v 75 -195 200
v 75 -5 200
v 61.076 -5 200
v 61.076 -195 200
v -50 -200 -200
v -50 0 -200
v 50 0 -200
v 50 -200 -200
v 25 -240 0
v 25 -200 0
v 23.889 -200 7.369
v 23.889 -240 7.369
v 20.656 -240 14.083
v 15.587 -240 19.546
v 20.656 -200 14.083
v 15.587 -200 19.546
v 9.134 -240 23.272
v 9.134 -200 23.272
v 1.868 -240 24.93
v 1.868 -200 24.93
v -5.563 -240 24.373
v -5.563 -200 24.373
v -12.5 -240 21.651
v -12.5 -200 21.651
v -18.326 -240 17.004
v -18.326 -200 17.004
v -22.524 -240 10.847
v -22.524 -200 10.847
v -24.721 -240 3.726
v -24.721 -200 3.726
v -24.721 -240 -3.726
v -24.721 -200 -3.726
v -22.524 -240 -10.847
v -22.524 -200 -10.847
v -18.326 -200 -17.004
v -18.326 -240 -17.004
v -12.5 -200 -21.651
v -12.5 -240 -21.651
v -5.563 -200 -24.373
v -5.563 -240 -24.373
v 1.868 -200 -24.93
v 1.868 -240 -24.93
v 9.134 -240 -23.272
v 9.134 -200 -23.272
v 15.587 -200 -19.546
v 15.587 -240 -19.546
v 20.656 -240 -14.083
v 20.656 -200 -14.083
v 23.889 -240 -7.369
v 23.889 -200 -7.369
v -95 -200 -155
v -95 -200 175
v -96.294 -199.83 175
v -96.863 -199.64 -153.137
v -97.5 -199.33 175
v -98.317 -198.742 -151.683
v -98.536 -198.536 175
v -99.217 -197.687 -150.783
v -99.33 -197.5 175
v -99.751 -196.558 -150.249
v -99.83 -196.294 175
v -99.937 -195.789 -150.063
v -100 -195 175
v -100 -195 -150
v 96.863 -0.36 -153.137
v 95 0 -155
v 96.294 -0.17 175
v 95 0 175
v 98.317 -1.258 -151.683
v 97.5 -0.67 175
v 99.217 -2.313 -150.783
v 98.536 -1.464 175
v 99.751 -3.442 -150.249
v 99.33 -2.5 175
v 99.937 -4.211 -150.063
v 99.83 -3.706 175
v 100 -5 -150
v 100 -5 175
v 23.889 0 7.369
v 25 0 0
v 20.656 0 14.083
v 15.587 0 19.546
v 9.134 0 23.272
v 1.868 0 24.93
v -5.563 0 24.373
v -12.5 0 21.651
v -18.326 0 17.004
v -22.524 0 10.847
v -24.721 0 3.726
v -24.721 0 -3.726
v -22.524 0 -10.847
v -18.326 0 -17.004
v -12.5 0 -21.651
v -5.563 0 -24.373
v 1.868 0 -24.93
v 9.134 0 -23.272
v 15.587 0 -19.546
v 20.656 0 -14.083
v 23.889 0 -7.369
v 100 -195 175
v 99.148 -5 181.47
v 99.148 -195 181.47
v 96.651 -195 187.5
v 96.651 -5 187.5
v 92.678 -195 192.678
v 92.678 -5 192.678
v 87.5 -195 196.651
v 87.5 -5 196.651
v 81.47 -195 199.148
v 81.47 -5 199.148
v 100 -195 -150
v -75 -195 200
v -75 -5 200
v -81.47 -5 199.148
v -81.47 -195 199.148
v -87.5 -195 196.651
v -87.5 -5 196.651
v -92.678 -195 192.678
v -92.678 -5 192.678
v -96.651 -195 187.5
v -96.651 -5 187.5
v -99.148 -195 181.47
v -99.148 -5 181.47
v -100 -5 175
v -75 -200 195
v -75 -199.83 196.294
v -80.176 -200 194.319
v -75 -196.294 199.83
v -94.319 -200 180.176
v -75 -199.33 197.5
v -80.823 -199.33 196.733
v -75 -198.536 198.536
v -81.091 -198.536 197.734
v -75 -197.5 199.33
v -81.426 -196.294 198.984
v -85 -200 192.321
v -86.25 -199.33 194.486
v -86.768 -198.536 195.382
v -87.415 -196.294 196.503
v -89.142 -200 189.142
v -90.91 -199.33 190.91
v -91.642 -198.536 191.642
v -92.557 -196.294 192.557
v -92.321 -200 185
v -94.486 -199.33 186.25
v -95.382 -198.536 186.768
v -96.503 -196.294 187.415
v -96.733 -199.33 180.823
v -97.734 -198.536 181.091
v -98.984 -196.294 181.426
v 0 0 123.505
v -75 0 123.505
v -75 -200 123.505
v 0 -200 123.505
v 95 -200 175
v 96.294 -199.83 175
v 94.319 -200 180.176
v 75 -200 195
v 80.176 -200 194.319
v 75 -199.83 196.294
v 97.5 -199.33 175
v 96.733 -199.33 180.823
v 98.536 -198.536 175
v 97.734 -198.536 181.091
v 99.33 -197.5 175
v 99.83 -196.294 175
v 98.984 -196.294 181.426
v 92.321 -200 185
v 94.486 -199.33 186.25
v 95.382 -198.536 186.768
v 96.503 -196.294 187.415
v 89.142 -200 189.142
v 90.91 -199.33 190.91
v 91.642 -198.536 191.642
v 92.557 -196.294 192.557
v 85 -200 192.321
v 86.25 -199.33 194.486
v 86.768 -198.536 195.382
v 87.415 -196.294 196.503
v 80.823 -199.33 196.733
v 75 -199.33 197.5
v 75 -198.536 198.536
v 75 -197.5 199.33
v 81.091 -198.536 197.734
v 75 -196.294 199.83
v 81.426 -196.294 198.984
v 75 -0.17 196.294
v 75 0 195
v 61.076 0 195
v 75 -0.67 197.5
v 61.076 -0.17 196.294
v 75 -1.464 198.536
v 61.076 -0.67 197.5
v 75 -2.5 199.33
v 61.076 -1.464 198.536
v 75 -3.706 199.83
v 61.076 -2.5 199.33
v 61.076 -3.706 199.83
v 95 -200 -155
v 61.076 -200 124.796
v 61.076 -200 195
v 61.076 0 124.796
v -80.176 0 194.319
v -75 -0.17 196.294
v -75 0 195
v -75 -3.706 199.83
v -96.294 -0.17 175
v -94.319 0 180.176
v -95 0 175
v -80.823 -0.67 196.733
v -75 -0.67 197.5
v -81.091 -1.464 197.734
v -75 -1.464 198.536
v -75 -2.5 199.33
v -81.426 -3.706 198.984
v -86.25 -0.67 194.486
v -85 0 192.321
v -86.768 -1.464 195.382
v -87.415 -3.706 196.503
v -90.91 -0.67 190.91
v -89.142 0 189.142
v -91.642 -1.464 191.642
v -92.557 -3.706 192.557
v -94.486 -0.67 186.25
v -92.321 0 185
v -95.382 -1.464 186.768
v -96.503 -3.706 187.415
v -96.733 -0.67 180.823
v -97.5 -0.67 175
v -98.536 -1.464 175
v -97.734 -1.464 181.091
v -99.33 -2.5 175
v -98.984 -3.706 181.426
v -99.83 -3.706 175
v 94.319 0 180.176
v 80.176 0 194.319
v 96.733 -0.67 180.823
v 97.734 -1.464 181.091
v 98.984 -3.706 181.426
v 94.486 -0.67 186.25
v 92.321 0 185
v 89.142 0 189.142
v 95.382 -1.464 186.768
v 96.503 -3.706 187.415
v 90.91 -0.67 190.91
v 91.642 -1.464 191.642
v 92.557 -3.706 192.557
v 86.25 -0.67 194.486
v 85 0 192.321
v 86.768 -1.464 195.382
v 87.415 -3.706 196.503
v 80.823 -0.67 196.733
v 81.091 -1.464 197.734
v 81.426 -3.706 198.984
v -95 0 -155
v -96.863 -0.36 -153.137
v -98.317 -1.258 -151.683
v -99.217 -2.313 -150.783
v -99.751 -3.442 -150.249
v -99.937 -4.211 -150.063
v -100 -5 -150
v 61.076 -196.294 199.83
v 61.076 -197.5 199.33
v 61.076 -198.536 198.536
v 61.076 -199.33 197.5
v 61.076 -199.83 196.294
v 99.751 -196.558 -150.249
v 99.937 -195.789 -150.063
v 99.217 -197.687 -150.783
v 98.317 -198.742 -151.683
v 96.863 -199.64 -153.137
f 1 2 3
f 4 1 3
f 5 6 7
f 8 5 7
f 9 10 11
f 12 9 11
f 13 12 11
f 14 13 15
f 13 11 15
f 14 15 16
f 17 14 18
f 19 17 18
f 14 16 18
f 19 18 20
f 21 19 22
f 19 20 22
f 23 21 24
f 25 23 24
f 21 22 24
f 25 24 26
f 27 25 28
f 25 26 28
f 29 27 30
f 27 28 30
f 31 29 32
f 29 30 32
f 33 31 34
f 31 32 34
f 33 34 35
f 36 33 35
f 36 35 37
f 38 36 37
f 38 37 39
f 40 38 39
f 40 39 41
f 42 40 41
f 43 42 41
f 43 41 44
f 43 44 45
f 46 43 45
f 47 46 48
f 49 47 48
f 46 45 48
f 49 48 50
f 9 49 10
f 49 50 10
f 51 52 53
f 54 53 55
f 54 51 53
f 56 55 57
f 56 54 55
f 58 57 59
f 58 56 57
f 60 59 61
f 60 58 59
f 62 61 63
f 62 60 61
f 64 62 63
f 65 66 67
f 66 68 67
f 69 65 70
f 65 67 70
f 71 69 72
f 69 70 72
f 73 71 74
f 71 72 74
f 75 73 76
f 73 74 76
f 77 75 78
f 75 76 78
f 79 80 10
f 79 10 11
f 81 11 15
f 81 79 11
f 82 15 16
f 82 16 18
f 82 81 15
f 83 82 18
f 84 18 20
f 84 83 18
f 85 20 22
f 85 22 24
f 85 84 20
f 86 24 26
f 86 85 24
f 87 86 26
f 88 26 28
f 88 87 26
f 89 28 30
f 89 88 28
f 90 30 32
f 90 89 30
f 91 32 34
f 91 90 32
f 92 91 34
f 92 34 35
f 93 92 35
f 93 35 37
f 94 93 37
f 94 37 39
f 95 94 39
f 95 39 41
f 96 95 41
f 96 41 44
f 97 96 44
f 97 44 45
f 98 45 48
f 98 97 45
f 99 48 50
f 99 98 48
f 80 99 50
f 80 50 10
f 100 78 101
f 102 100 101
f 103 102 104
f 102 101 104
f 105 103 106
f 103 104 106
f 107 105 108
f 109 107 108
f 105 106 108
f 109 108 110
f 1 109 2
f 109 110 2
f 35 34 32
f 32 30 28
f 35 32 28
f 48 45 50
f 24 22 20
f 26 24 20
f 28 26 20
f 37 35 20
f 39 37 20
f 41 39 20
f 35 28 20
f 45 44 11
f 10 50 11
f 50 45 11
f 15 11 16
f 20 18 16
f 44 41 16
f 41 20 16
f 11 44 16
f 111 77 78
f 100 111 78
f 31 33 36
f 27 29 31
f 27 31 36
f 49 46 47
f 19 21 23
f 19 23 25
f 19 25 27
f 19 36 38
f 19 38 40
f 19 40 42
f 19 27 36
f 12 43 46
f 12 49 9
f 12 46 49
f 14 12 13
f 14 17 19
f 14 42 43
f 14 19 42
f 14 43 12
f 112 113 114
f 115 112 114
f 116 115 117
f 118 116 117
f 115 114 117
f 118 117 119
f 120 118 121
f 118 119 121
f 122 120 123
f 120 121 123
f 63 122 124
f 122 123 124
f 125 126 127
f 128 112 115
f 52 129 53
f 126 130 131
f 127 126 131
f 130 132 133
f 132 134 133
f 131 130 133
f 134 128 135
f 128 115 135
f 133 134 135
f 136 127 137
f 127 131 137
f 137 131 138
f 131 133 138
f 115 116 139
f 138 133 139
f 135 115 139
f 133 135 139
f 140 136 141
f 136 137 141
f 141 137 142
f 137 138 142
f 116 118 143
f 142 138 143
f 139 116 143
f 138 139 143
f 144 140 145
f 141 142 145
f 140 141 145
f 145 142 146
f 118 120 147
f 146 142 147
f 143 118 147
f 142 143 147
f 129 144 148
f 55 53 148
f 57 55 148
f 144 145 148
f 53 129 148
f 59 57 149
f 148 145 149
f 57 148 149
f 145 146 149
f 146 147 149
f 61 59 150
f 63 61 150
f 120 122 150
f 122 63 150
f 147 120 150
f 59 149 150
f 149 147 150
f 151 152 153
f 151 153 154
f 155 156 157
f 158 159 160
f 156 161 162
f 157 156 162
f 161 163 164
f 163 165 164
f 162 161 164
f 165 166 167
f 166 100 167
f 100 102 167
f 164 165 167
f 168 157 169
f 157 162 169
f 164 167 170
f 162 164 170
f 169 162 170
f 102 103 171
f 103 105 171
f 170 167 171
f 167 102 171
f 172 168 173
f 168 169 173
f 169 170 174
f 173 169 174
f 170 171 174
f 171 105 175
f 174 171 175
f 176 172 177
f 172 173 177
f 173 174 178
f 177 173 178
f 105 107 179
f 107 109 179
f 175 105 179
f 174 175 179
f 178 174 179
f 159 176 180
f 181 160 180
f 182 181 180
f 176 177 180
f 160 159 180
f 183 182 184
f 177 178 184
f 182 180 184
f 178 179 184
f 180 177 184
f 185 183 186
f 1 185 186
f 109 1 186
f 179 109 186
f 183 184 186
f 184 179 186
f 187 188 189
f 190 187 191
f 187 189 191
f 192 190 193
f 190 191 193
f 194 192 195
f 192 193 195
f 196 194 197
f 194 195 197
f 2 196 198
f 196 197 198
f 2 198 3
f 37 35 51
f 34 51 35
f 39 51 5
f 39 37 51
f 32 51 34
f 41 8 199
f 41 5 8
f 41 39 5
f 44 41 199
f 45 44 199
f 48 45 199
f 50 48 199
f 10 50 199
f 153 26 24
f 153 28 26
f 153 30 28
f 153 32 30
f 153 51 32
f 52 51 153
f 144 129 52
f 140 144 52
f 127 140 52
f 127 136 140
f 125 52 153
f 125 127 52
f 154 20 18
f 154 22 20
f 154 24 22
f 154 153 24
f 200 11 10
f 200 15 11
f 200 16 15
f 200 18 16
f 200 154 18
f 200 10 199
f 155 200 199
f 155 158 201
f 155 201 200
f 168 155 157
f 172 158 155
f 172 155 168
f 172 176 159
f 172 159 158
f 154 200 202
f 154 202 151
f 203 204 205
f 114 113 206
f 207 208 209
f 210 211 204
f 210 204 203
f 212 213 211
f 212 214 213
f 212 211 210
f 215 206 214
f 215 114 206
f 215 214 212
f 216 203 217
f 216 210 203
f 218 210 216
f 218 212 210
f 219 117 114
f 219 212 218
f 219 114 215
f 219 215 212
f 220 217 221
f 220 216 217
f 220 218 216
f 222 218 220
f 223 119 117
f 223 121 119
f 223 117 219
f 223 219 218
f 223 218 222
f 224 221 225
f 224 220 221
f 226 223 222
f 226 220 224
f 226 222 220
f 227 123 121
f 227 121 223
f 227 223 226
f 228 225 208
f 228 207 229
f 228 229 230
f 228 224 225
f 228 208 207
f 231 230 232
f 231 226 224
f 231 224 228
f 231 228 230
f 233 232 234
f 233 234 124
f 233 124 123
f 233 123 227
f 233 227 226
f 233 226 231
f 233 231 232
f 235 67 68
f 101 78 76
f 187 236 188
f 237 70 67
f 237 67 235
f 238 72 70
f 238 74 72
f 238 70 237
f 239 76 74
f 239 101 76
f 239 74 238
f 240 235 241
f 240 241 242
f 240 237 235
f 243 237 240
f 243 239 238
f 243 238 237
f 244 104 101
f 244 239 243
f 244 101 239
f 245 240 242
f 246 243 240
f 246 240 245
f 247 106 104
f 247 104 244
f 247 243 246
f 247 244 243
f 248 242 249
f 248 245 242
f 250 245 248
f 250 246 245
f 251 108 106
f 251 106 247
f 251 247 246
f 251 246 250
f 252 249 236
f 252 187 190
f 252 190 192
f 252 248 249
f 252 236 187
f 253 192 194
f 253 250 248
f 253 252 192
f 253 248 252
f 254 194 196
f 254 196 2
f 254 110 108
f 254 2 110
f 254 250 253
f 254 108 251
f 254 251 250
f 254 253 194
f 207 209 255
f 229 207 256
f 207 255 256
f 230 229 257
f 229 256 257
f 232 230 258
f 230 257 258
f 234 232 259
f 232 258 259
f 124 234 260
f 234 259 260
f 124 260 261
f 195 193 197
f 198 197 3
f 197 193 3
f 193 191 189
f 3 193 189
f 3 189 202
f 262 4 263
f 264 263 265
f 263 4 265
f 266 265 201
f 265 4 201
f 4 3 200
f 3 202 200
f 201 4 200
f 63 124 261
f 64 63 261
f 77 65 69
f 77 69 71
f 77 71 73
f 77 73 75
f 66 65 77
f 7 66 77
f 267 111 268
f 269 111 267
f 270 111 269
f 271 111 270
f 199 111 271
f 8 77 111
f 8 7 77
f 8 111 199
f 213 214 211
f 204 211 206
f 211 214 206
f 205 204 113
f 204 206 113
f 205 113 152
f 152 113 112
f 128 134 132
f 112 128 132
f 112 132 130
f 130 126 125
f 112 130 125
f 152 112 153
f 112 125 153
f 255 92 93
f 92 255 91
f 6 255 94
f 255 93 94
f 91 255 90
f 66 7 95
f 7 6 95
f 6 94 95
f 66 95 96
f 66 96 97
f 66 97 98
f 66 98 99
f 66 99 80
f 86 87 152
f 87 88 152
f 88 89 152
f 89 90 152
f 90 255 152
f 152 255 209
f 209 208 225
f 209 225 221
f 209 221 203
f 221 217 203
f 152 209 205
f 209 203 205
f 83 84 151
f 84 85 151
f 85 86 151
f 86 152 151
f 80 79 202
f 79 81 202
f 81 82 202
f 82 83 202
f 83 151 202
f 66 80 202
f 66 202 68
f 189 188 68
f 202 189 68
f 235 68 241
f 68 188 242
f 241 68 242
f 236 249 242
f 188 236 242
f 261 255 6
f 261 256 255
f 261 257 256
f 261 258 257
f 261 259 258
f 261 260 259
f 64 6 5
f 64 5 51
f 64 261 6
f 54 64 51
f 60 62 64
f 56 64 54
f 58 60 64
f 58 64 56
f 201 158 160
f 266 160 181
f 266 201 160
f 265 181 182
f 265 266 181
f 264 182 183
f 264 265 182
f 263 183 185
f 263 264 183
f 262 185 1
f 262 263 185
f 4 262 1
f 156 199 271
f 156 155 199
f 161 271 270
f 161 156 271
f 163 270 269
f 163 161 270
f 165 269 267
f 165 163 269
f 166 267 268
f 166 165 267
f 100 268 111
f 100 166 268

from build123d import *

# Parameters (mm, degrees)
F0_R       = 25
F1_DEPTH   = 200
F2_SIZE    = 50
F3_R       = 5
F4_R       = 25
F5_DEPTH   = 40
F1_FACE1_R = 25
F7_DEPTH   = 5025
F9_DEPTH   = 25
F10_DEPTH  = 450
F11_DEPTH  = 700
F12_DEPTH  = 25


with BuildPart() as f1:
    # F0 (on Front) → F1 (new body)
    with BuildSketch(Plane.XZ):
        with BuildLine():
            ThreePointArc((100, 175), (92.6776695297, 192.6776695297), (75, 200))
            Line((75, 200), (-75, 200))
            ThreePointArc((-75, 200), (-92.6776695297, 192.6776695297), (-100, 175))
            Line((-100, 175), (-100, -200))
            Line((-100, -200), (100, -200))
            Line((100, -200), (100, 175))
        make_face()
        Circle(F0_R, mode=Mode.SUBTRACT)
    extrude(amount=F1_DEPTH)

    # F2
    f2_edges = [f1.edges().sort_by_distance(p)[0] for p in [
        (100, -100, -200),
        (-100, -100, -200),
    ]]
    chamfer(f2_edges, length=F2_SIZE)

    # F3
    f3_edges = [f1.edges().sort_by_distance(p)[0] for p in [
        (75, -100, 200),
        (-75, -100, 200),
        (0, 0, 200),
        (0, -200, 200),
    ]]
    fillet(f3_edges, radius=F3_R)

    # F6 (on face) + F1_face1 (on face) → F7 (cut)
    with BuildSketch(Plane.XZ.offset(200)):
        Polygon((-75, 213.1325900555), (-75, 195), (-75, 123.5051602125), (0, 123.5051602125), (0, 213.1325900555), align=None)
    with BuildSketch(Plane(origin=(0, 0, 2.1764629874), x_dir=(1, 0, 0), z_dir=(0, 1, 0))):
        with BuildLine():
            Line((-50, 202.1764629874), (-95, 157.1764629874))
            Line((-95, 157.1764629874), (-95, -172.8235370126))
            ThreePointArc((-95, -172.8235370126), (-89.1421356237, -186.9656726363), (-75, -192.8235370126))
            Line((-75, -192.8235370126), (75, -192.8235370126))
            ThreePointArc((75, -192.8235370126), (89.1421356237, -186.9656726363), (95, -172.8235370126))
            Line((95, -172.8235370126), (95, 157.1764629874))
            Line((95, 157.1764629874), (50, 202.1764629874))
            Line((50, 202.1764629874), (-50, 202.1764629874))
        make_face()
        with Locations((0, 2.1764629874)):
            Circle(F1_FACE1_R, mode=Mode.SUBTRACT)
    extrude(amount=-F7_DEPTH, dir=(0, -1, 0), mode=Mode.SUBTRACT)

    # F8 (on face) → F9 (cut)
    with BuildSketch(Plane(origin=(0, 0, 0), x_dir=(-1, 0, 0), z_dir=(0, 1, 0))):
        Polygon((0, 195), (-61.0763393342, 195), (-61.0763393342, 124.79570508), (0, 123.5051602125), align=None)
    extrude(amount=-F9_DEPTH, mode=Mode.SUBTRACT)

    # F10 (add): a face of the model
    f10_faces = [f1.faces().sort_by_distance(p)[0] for p in [
        (30.4454594371, -25, 159.5742368382),
    ]]
    extrude(f10_faces, amount=F10_DEPTH)

    # F11 (cut): a face of the model
    f11_faces = [f1.faces().sort_by_distance(p)[0] for p in [
        (30.4454594371, 425, 159.5742368382),
    ]]
    extrude(f11_faces, amount=-F11_DEPTH, mode=Mode.SUBTRACT)

    # F12 (cut): a face of the model
    f12_faces = [f1.faces().sort_by_distance(p)[0] for p in [
        (30.5381696671, -100, 195),
    ]]
    extrude(f12_faces, amount=-F12_DEPTH, mode=Mode.SUBTRACT)


with BuildPart() as f5:
    # F4 (on face) → F5 (new body)
    with BuildSketch(Plane.XZ.offset(200)):
        Circle(F4_R)
    extrude(amount=F5_DEPTH)


solid = Compound([f1.part, f5.part])
